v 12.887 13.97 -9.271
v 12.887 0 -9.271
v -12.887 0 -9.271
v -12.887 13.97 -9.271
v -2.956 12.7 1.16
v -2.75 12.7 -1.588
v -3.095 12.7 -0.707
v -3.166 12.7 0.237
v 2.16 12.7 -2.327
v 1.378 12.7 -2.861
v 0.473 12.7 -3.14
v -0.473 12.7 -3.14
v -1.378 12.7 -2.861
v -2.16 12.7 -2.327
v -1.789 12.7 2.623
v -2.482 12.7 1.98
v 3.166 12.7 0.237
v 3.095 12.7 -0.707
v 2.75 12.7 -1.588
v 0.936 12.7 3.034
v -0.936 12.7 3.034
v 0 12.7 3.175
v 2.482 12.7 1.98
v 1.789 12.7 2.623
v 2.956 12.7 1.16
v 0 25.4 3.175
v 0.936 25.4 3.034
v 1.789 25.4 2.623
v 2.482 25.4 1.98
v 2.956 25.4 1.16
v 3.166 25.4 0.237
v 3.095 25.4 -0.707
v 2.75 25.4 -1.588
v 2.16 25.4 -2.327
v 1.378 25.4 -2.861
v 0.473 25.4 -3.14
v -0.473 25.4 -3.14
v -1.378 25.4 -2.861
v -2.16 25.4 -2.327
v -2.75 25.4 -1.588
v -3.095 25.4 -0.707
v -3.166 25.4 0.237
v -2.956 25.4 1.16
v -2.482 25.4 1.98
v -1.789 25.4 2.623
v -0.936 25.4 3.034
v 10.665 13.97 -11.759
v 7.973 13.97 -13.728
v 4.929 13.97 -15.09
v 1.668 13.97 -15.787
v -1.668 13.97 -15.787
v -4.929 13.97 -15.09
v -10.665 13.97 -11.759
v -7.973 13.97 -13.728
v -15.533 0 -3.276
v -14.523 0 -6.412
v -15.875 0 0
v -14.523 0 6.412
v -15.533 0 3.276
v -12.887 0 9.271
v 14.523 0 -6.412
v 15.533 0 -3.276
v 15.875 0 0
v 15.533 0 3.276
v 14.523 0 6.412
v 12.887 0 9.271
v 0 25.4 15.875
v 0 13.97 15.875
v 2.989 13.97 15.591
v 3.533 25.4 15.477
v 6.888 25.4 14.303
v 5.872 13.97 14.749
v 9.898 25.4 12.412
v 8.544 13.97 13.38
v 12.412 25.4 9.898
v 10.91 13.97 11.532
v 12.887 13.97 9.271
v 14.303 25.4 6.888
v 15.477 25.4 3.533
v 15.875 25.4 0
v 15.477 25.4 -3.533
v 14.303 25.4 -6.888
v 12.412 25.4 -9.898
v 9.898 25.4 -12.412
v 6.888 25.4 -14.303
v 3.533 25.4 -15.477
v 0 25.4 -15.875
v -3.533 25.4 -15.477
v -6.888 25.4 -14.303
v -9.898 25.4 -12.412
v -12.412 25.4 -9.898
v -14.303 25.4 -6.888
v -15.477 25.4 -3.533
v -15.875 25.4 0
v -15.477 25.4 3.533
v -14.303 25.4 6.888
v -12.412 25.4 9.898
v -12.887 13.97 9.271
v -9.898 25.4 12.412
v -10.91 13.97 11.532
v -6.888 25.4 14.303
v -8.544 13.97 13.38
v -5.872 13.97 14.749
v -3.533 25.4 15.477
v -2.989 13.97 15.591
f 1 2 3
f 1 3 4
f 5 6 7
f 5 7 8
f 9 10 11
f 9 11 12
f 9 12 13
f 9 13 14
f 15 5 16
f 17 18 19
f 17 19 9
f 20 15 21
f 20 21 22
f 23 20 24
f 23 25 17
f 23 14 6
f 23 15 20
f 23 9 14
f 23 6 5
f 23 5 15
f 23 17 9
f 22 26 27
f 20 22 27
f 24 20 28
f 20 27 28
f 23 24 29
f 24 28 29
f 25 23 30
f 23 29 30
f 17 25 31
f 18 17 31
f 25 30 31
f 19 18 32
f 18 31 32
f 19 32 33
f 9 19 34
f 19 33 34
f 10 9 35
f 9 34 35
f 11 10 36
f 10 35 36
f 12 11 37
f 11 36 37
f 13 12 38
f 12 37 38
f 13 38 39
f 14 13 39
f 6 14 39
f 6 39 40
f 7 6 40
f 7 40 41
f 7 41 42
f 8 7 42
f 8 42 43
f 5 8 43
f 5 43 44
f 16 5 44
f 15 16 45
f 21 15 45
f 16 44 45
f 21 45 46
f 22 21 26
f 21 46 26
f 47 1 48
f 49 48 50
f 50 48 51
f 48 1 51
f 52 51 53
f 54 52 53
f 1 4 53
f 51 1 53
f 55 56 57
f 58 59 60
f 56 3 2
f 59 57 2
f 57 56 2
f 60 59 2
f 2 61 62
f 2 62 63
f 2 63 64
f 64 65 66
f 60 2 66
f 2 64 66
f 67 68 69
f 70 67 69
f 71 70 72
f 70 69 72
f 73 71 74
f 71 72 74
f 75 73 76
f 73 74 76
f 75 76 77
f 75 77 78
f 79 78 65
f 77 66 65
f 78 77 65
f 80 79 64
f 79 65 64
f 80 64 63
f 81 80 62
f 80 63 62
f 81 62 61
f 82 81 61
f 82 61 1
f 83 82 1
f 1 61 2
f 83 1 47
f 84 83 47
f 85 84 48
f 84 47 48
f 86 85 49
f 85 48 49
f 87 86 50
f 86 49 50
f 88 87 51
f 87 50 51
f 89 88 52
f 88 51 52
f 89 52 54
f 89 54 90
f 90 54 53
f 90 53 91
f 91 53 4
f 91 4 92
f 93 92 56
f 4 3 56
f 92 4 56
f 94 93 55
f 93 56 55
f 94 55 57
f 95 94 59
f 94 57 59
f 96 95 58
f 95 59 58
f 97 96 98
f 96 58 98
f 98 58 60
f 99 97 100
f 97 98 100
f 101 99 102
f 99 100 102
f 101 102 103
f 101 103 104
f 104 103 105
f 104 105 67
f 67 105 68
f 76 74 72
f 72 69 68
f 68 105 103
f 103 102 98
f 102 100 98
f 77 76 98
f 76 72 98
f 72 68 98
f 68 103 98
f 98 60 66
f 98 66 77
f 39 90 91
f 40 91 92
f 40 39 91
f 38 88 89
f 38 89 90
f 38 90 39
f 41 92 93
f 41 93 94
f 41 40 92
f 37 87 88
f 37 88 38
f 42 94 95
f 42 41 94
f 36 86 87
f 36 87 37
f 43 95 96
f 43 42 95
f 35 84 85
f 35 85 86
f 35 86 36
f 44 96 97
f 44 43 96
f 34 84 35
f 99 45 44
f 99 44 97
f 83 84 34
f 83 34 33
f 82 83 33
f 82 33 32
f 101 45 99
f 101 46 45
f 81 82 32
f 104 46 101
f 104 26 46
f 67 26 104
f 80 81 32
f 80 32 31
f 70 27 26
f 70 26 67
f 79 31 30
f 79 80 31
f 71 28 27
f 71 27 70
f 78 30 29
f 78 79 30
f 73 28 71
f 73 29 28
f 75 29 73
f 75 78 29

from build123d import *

# Parameters (mm, degrees)
SKETCH1_R               = 15.875
BOSS_EXTRUDE1_DEPTH     = 25.4
CUT_EXTRUDE1_DEPTH      = 34.89972345
CUT_EXTRUDE1_DEPTH_BACK = 34.89972345
SKETCH2_W               = 6.604
SKETCH2_H               = 13.97
SKETCH3_R               = 3.175
CUT_EXTRUDE2_DEPTH      = 12.7


with BuildPart() as part:
    # Sketch1 → Boss-Extrude1 (new body)
    with BuildSketch(Plane(origin=(0, 0, 0), x_dir=(1, 0, 0), z_dir=(0, 1, 0))):
        with Locations(Location((0, 0, 0), (0, 0, 270))):
            Circle(SKETCH1_R)
    extrude(amount=BOSS_EXTRUDE1_DEPTH)

    # Sketch2 → Cut-Extrude1 (cut, two sides: drawn at the far end of the back side and taken through both)
    with BuildSketch(Plane(origin=(0, 0, 0), x_dir=(0, 0, -1), z_dir=(1, 0, 0)).offset(-CUT_EXTRUDE1_DEPTH_BACK)):
        with Locations((12.573, 6.985)):
            Rectangle(SKETCH2_W, SKETCH2_H)
        with Locations((-12.573, 6.985)):
            Rectangle(SKETCH2_W, SKETCH2_H)
    extrude(amount=CUT_EXTRUDE1_DEPTH + CUT_EXTRUDE1_DEPTH_BACK, mode=Mode.SUBTRACT)

    # Sketch3 → Cut-Extrude2 (cut)
    with BuildSketch(Plane(origin=(0, 25.4, 0), x_dir=(1, 0, 0), z_dir=(0, 1, 0))):
        with Locations(Location((0, 0, 0), (0, 0, 270))):
            Circle(SKETCH3_R)
    extrude(amount=-CUT_EXTRUDE2_DEPTH, mode=Mode.SUBTRACT)


solid = part.part
